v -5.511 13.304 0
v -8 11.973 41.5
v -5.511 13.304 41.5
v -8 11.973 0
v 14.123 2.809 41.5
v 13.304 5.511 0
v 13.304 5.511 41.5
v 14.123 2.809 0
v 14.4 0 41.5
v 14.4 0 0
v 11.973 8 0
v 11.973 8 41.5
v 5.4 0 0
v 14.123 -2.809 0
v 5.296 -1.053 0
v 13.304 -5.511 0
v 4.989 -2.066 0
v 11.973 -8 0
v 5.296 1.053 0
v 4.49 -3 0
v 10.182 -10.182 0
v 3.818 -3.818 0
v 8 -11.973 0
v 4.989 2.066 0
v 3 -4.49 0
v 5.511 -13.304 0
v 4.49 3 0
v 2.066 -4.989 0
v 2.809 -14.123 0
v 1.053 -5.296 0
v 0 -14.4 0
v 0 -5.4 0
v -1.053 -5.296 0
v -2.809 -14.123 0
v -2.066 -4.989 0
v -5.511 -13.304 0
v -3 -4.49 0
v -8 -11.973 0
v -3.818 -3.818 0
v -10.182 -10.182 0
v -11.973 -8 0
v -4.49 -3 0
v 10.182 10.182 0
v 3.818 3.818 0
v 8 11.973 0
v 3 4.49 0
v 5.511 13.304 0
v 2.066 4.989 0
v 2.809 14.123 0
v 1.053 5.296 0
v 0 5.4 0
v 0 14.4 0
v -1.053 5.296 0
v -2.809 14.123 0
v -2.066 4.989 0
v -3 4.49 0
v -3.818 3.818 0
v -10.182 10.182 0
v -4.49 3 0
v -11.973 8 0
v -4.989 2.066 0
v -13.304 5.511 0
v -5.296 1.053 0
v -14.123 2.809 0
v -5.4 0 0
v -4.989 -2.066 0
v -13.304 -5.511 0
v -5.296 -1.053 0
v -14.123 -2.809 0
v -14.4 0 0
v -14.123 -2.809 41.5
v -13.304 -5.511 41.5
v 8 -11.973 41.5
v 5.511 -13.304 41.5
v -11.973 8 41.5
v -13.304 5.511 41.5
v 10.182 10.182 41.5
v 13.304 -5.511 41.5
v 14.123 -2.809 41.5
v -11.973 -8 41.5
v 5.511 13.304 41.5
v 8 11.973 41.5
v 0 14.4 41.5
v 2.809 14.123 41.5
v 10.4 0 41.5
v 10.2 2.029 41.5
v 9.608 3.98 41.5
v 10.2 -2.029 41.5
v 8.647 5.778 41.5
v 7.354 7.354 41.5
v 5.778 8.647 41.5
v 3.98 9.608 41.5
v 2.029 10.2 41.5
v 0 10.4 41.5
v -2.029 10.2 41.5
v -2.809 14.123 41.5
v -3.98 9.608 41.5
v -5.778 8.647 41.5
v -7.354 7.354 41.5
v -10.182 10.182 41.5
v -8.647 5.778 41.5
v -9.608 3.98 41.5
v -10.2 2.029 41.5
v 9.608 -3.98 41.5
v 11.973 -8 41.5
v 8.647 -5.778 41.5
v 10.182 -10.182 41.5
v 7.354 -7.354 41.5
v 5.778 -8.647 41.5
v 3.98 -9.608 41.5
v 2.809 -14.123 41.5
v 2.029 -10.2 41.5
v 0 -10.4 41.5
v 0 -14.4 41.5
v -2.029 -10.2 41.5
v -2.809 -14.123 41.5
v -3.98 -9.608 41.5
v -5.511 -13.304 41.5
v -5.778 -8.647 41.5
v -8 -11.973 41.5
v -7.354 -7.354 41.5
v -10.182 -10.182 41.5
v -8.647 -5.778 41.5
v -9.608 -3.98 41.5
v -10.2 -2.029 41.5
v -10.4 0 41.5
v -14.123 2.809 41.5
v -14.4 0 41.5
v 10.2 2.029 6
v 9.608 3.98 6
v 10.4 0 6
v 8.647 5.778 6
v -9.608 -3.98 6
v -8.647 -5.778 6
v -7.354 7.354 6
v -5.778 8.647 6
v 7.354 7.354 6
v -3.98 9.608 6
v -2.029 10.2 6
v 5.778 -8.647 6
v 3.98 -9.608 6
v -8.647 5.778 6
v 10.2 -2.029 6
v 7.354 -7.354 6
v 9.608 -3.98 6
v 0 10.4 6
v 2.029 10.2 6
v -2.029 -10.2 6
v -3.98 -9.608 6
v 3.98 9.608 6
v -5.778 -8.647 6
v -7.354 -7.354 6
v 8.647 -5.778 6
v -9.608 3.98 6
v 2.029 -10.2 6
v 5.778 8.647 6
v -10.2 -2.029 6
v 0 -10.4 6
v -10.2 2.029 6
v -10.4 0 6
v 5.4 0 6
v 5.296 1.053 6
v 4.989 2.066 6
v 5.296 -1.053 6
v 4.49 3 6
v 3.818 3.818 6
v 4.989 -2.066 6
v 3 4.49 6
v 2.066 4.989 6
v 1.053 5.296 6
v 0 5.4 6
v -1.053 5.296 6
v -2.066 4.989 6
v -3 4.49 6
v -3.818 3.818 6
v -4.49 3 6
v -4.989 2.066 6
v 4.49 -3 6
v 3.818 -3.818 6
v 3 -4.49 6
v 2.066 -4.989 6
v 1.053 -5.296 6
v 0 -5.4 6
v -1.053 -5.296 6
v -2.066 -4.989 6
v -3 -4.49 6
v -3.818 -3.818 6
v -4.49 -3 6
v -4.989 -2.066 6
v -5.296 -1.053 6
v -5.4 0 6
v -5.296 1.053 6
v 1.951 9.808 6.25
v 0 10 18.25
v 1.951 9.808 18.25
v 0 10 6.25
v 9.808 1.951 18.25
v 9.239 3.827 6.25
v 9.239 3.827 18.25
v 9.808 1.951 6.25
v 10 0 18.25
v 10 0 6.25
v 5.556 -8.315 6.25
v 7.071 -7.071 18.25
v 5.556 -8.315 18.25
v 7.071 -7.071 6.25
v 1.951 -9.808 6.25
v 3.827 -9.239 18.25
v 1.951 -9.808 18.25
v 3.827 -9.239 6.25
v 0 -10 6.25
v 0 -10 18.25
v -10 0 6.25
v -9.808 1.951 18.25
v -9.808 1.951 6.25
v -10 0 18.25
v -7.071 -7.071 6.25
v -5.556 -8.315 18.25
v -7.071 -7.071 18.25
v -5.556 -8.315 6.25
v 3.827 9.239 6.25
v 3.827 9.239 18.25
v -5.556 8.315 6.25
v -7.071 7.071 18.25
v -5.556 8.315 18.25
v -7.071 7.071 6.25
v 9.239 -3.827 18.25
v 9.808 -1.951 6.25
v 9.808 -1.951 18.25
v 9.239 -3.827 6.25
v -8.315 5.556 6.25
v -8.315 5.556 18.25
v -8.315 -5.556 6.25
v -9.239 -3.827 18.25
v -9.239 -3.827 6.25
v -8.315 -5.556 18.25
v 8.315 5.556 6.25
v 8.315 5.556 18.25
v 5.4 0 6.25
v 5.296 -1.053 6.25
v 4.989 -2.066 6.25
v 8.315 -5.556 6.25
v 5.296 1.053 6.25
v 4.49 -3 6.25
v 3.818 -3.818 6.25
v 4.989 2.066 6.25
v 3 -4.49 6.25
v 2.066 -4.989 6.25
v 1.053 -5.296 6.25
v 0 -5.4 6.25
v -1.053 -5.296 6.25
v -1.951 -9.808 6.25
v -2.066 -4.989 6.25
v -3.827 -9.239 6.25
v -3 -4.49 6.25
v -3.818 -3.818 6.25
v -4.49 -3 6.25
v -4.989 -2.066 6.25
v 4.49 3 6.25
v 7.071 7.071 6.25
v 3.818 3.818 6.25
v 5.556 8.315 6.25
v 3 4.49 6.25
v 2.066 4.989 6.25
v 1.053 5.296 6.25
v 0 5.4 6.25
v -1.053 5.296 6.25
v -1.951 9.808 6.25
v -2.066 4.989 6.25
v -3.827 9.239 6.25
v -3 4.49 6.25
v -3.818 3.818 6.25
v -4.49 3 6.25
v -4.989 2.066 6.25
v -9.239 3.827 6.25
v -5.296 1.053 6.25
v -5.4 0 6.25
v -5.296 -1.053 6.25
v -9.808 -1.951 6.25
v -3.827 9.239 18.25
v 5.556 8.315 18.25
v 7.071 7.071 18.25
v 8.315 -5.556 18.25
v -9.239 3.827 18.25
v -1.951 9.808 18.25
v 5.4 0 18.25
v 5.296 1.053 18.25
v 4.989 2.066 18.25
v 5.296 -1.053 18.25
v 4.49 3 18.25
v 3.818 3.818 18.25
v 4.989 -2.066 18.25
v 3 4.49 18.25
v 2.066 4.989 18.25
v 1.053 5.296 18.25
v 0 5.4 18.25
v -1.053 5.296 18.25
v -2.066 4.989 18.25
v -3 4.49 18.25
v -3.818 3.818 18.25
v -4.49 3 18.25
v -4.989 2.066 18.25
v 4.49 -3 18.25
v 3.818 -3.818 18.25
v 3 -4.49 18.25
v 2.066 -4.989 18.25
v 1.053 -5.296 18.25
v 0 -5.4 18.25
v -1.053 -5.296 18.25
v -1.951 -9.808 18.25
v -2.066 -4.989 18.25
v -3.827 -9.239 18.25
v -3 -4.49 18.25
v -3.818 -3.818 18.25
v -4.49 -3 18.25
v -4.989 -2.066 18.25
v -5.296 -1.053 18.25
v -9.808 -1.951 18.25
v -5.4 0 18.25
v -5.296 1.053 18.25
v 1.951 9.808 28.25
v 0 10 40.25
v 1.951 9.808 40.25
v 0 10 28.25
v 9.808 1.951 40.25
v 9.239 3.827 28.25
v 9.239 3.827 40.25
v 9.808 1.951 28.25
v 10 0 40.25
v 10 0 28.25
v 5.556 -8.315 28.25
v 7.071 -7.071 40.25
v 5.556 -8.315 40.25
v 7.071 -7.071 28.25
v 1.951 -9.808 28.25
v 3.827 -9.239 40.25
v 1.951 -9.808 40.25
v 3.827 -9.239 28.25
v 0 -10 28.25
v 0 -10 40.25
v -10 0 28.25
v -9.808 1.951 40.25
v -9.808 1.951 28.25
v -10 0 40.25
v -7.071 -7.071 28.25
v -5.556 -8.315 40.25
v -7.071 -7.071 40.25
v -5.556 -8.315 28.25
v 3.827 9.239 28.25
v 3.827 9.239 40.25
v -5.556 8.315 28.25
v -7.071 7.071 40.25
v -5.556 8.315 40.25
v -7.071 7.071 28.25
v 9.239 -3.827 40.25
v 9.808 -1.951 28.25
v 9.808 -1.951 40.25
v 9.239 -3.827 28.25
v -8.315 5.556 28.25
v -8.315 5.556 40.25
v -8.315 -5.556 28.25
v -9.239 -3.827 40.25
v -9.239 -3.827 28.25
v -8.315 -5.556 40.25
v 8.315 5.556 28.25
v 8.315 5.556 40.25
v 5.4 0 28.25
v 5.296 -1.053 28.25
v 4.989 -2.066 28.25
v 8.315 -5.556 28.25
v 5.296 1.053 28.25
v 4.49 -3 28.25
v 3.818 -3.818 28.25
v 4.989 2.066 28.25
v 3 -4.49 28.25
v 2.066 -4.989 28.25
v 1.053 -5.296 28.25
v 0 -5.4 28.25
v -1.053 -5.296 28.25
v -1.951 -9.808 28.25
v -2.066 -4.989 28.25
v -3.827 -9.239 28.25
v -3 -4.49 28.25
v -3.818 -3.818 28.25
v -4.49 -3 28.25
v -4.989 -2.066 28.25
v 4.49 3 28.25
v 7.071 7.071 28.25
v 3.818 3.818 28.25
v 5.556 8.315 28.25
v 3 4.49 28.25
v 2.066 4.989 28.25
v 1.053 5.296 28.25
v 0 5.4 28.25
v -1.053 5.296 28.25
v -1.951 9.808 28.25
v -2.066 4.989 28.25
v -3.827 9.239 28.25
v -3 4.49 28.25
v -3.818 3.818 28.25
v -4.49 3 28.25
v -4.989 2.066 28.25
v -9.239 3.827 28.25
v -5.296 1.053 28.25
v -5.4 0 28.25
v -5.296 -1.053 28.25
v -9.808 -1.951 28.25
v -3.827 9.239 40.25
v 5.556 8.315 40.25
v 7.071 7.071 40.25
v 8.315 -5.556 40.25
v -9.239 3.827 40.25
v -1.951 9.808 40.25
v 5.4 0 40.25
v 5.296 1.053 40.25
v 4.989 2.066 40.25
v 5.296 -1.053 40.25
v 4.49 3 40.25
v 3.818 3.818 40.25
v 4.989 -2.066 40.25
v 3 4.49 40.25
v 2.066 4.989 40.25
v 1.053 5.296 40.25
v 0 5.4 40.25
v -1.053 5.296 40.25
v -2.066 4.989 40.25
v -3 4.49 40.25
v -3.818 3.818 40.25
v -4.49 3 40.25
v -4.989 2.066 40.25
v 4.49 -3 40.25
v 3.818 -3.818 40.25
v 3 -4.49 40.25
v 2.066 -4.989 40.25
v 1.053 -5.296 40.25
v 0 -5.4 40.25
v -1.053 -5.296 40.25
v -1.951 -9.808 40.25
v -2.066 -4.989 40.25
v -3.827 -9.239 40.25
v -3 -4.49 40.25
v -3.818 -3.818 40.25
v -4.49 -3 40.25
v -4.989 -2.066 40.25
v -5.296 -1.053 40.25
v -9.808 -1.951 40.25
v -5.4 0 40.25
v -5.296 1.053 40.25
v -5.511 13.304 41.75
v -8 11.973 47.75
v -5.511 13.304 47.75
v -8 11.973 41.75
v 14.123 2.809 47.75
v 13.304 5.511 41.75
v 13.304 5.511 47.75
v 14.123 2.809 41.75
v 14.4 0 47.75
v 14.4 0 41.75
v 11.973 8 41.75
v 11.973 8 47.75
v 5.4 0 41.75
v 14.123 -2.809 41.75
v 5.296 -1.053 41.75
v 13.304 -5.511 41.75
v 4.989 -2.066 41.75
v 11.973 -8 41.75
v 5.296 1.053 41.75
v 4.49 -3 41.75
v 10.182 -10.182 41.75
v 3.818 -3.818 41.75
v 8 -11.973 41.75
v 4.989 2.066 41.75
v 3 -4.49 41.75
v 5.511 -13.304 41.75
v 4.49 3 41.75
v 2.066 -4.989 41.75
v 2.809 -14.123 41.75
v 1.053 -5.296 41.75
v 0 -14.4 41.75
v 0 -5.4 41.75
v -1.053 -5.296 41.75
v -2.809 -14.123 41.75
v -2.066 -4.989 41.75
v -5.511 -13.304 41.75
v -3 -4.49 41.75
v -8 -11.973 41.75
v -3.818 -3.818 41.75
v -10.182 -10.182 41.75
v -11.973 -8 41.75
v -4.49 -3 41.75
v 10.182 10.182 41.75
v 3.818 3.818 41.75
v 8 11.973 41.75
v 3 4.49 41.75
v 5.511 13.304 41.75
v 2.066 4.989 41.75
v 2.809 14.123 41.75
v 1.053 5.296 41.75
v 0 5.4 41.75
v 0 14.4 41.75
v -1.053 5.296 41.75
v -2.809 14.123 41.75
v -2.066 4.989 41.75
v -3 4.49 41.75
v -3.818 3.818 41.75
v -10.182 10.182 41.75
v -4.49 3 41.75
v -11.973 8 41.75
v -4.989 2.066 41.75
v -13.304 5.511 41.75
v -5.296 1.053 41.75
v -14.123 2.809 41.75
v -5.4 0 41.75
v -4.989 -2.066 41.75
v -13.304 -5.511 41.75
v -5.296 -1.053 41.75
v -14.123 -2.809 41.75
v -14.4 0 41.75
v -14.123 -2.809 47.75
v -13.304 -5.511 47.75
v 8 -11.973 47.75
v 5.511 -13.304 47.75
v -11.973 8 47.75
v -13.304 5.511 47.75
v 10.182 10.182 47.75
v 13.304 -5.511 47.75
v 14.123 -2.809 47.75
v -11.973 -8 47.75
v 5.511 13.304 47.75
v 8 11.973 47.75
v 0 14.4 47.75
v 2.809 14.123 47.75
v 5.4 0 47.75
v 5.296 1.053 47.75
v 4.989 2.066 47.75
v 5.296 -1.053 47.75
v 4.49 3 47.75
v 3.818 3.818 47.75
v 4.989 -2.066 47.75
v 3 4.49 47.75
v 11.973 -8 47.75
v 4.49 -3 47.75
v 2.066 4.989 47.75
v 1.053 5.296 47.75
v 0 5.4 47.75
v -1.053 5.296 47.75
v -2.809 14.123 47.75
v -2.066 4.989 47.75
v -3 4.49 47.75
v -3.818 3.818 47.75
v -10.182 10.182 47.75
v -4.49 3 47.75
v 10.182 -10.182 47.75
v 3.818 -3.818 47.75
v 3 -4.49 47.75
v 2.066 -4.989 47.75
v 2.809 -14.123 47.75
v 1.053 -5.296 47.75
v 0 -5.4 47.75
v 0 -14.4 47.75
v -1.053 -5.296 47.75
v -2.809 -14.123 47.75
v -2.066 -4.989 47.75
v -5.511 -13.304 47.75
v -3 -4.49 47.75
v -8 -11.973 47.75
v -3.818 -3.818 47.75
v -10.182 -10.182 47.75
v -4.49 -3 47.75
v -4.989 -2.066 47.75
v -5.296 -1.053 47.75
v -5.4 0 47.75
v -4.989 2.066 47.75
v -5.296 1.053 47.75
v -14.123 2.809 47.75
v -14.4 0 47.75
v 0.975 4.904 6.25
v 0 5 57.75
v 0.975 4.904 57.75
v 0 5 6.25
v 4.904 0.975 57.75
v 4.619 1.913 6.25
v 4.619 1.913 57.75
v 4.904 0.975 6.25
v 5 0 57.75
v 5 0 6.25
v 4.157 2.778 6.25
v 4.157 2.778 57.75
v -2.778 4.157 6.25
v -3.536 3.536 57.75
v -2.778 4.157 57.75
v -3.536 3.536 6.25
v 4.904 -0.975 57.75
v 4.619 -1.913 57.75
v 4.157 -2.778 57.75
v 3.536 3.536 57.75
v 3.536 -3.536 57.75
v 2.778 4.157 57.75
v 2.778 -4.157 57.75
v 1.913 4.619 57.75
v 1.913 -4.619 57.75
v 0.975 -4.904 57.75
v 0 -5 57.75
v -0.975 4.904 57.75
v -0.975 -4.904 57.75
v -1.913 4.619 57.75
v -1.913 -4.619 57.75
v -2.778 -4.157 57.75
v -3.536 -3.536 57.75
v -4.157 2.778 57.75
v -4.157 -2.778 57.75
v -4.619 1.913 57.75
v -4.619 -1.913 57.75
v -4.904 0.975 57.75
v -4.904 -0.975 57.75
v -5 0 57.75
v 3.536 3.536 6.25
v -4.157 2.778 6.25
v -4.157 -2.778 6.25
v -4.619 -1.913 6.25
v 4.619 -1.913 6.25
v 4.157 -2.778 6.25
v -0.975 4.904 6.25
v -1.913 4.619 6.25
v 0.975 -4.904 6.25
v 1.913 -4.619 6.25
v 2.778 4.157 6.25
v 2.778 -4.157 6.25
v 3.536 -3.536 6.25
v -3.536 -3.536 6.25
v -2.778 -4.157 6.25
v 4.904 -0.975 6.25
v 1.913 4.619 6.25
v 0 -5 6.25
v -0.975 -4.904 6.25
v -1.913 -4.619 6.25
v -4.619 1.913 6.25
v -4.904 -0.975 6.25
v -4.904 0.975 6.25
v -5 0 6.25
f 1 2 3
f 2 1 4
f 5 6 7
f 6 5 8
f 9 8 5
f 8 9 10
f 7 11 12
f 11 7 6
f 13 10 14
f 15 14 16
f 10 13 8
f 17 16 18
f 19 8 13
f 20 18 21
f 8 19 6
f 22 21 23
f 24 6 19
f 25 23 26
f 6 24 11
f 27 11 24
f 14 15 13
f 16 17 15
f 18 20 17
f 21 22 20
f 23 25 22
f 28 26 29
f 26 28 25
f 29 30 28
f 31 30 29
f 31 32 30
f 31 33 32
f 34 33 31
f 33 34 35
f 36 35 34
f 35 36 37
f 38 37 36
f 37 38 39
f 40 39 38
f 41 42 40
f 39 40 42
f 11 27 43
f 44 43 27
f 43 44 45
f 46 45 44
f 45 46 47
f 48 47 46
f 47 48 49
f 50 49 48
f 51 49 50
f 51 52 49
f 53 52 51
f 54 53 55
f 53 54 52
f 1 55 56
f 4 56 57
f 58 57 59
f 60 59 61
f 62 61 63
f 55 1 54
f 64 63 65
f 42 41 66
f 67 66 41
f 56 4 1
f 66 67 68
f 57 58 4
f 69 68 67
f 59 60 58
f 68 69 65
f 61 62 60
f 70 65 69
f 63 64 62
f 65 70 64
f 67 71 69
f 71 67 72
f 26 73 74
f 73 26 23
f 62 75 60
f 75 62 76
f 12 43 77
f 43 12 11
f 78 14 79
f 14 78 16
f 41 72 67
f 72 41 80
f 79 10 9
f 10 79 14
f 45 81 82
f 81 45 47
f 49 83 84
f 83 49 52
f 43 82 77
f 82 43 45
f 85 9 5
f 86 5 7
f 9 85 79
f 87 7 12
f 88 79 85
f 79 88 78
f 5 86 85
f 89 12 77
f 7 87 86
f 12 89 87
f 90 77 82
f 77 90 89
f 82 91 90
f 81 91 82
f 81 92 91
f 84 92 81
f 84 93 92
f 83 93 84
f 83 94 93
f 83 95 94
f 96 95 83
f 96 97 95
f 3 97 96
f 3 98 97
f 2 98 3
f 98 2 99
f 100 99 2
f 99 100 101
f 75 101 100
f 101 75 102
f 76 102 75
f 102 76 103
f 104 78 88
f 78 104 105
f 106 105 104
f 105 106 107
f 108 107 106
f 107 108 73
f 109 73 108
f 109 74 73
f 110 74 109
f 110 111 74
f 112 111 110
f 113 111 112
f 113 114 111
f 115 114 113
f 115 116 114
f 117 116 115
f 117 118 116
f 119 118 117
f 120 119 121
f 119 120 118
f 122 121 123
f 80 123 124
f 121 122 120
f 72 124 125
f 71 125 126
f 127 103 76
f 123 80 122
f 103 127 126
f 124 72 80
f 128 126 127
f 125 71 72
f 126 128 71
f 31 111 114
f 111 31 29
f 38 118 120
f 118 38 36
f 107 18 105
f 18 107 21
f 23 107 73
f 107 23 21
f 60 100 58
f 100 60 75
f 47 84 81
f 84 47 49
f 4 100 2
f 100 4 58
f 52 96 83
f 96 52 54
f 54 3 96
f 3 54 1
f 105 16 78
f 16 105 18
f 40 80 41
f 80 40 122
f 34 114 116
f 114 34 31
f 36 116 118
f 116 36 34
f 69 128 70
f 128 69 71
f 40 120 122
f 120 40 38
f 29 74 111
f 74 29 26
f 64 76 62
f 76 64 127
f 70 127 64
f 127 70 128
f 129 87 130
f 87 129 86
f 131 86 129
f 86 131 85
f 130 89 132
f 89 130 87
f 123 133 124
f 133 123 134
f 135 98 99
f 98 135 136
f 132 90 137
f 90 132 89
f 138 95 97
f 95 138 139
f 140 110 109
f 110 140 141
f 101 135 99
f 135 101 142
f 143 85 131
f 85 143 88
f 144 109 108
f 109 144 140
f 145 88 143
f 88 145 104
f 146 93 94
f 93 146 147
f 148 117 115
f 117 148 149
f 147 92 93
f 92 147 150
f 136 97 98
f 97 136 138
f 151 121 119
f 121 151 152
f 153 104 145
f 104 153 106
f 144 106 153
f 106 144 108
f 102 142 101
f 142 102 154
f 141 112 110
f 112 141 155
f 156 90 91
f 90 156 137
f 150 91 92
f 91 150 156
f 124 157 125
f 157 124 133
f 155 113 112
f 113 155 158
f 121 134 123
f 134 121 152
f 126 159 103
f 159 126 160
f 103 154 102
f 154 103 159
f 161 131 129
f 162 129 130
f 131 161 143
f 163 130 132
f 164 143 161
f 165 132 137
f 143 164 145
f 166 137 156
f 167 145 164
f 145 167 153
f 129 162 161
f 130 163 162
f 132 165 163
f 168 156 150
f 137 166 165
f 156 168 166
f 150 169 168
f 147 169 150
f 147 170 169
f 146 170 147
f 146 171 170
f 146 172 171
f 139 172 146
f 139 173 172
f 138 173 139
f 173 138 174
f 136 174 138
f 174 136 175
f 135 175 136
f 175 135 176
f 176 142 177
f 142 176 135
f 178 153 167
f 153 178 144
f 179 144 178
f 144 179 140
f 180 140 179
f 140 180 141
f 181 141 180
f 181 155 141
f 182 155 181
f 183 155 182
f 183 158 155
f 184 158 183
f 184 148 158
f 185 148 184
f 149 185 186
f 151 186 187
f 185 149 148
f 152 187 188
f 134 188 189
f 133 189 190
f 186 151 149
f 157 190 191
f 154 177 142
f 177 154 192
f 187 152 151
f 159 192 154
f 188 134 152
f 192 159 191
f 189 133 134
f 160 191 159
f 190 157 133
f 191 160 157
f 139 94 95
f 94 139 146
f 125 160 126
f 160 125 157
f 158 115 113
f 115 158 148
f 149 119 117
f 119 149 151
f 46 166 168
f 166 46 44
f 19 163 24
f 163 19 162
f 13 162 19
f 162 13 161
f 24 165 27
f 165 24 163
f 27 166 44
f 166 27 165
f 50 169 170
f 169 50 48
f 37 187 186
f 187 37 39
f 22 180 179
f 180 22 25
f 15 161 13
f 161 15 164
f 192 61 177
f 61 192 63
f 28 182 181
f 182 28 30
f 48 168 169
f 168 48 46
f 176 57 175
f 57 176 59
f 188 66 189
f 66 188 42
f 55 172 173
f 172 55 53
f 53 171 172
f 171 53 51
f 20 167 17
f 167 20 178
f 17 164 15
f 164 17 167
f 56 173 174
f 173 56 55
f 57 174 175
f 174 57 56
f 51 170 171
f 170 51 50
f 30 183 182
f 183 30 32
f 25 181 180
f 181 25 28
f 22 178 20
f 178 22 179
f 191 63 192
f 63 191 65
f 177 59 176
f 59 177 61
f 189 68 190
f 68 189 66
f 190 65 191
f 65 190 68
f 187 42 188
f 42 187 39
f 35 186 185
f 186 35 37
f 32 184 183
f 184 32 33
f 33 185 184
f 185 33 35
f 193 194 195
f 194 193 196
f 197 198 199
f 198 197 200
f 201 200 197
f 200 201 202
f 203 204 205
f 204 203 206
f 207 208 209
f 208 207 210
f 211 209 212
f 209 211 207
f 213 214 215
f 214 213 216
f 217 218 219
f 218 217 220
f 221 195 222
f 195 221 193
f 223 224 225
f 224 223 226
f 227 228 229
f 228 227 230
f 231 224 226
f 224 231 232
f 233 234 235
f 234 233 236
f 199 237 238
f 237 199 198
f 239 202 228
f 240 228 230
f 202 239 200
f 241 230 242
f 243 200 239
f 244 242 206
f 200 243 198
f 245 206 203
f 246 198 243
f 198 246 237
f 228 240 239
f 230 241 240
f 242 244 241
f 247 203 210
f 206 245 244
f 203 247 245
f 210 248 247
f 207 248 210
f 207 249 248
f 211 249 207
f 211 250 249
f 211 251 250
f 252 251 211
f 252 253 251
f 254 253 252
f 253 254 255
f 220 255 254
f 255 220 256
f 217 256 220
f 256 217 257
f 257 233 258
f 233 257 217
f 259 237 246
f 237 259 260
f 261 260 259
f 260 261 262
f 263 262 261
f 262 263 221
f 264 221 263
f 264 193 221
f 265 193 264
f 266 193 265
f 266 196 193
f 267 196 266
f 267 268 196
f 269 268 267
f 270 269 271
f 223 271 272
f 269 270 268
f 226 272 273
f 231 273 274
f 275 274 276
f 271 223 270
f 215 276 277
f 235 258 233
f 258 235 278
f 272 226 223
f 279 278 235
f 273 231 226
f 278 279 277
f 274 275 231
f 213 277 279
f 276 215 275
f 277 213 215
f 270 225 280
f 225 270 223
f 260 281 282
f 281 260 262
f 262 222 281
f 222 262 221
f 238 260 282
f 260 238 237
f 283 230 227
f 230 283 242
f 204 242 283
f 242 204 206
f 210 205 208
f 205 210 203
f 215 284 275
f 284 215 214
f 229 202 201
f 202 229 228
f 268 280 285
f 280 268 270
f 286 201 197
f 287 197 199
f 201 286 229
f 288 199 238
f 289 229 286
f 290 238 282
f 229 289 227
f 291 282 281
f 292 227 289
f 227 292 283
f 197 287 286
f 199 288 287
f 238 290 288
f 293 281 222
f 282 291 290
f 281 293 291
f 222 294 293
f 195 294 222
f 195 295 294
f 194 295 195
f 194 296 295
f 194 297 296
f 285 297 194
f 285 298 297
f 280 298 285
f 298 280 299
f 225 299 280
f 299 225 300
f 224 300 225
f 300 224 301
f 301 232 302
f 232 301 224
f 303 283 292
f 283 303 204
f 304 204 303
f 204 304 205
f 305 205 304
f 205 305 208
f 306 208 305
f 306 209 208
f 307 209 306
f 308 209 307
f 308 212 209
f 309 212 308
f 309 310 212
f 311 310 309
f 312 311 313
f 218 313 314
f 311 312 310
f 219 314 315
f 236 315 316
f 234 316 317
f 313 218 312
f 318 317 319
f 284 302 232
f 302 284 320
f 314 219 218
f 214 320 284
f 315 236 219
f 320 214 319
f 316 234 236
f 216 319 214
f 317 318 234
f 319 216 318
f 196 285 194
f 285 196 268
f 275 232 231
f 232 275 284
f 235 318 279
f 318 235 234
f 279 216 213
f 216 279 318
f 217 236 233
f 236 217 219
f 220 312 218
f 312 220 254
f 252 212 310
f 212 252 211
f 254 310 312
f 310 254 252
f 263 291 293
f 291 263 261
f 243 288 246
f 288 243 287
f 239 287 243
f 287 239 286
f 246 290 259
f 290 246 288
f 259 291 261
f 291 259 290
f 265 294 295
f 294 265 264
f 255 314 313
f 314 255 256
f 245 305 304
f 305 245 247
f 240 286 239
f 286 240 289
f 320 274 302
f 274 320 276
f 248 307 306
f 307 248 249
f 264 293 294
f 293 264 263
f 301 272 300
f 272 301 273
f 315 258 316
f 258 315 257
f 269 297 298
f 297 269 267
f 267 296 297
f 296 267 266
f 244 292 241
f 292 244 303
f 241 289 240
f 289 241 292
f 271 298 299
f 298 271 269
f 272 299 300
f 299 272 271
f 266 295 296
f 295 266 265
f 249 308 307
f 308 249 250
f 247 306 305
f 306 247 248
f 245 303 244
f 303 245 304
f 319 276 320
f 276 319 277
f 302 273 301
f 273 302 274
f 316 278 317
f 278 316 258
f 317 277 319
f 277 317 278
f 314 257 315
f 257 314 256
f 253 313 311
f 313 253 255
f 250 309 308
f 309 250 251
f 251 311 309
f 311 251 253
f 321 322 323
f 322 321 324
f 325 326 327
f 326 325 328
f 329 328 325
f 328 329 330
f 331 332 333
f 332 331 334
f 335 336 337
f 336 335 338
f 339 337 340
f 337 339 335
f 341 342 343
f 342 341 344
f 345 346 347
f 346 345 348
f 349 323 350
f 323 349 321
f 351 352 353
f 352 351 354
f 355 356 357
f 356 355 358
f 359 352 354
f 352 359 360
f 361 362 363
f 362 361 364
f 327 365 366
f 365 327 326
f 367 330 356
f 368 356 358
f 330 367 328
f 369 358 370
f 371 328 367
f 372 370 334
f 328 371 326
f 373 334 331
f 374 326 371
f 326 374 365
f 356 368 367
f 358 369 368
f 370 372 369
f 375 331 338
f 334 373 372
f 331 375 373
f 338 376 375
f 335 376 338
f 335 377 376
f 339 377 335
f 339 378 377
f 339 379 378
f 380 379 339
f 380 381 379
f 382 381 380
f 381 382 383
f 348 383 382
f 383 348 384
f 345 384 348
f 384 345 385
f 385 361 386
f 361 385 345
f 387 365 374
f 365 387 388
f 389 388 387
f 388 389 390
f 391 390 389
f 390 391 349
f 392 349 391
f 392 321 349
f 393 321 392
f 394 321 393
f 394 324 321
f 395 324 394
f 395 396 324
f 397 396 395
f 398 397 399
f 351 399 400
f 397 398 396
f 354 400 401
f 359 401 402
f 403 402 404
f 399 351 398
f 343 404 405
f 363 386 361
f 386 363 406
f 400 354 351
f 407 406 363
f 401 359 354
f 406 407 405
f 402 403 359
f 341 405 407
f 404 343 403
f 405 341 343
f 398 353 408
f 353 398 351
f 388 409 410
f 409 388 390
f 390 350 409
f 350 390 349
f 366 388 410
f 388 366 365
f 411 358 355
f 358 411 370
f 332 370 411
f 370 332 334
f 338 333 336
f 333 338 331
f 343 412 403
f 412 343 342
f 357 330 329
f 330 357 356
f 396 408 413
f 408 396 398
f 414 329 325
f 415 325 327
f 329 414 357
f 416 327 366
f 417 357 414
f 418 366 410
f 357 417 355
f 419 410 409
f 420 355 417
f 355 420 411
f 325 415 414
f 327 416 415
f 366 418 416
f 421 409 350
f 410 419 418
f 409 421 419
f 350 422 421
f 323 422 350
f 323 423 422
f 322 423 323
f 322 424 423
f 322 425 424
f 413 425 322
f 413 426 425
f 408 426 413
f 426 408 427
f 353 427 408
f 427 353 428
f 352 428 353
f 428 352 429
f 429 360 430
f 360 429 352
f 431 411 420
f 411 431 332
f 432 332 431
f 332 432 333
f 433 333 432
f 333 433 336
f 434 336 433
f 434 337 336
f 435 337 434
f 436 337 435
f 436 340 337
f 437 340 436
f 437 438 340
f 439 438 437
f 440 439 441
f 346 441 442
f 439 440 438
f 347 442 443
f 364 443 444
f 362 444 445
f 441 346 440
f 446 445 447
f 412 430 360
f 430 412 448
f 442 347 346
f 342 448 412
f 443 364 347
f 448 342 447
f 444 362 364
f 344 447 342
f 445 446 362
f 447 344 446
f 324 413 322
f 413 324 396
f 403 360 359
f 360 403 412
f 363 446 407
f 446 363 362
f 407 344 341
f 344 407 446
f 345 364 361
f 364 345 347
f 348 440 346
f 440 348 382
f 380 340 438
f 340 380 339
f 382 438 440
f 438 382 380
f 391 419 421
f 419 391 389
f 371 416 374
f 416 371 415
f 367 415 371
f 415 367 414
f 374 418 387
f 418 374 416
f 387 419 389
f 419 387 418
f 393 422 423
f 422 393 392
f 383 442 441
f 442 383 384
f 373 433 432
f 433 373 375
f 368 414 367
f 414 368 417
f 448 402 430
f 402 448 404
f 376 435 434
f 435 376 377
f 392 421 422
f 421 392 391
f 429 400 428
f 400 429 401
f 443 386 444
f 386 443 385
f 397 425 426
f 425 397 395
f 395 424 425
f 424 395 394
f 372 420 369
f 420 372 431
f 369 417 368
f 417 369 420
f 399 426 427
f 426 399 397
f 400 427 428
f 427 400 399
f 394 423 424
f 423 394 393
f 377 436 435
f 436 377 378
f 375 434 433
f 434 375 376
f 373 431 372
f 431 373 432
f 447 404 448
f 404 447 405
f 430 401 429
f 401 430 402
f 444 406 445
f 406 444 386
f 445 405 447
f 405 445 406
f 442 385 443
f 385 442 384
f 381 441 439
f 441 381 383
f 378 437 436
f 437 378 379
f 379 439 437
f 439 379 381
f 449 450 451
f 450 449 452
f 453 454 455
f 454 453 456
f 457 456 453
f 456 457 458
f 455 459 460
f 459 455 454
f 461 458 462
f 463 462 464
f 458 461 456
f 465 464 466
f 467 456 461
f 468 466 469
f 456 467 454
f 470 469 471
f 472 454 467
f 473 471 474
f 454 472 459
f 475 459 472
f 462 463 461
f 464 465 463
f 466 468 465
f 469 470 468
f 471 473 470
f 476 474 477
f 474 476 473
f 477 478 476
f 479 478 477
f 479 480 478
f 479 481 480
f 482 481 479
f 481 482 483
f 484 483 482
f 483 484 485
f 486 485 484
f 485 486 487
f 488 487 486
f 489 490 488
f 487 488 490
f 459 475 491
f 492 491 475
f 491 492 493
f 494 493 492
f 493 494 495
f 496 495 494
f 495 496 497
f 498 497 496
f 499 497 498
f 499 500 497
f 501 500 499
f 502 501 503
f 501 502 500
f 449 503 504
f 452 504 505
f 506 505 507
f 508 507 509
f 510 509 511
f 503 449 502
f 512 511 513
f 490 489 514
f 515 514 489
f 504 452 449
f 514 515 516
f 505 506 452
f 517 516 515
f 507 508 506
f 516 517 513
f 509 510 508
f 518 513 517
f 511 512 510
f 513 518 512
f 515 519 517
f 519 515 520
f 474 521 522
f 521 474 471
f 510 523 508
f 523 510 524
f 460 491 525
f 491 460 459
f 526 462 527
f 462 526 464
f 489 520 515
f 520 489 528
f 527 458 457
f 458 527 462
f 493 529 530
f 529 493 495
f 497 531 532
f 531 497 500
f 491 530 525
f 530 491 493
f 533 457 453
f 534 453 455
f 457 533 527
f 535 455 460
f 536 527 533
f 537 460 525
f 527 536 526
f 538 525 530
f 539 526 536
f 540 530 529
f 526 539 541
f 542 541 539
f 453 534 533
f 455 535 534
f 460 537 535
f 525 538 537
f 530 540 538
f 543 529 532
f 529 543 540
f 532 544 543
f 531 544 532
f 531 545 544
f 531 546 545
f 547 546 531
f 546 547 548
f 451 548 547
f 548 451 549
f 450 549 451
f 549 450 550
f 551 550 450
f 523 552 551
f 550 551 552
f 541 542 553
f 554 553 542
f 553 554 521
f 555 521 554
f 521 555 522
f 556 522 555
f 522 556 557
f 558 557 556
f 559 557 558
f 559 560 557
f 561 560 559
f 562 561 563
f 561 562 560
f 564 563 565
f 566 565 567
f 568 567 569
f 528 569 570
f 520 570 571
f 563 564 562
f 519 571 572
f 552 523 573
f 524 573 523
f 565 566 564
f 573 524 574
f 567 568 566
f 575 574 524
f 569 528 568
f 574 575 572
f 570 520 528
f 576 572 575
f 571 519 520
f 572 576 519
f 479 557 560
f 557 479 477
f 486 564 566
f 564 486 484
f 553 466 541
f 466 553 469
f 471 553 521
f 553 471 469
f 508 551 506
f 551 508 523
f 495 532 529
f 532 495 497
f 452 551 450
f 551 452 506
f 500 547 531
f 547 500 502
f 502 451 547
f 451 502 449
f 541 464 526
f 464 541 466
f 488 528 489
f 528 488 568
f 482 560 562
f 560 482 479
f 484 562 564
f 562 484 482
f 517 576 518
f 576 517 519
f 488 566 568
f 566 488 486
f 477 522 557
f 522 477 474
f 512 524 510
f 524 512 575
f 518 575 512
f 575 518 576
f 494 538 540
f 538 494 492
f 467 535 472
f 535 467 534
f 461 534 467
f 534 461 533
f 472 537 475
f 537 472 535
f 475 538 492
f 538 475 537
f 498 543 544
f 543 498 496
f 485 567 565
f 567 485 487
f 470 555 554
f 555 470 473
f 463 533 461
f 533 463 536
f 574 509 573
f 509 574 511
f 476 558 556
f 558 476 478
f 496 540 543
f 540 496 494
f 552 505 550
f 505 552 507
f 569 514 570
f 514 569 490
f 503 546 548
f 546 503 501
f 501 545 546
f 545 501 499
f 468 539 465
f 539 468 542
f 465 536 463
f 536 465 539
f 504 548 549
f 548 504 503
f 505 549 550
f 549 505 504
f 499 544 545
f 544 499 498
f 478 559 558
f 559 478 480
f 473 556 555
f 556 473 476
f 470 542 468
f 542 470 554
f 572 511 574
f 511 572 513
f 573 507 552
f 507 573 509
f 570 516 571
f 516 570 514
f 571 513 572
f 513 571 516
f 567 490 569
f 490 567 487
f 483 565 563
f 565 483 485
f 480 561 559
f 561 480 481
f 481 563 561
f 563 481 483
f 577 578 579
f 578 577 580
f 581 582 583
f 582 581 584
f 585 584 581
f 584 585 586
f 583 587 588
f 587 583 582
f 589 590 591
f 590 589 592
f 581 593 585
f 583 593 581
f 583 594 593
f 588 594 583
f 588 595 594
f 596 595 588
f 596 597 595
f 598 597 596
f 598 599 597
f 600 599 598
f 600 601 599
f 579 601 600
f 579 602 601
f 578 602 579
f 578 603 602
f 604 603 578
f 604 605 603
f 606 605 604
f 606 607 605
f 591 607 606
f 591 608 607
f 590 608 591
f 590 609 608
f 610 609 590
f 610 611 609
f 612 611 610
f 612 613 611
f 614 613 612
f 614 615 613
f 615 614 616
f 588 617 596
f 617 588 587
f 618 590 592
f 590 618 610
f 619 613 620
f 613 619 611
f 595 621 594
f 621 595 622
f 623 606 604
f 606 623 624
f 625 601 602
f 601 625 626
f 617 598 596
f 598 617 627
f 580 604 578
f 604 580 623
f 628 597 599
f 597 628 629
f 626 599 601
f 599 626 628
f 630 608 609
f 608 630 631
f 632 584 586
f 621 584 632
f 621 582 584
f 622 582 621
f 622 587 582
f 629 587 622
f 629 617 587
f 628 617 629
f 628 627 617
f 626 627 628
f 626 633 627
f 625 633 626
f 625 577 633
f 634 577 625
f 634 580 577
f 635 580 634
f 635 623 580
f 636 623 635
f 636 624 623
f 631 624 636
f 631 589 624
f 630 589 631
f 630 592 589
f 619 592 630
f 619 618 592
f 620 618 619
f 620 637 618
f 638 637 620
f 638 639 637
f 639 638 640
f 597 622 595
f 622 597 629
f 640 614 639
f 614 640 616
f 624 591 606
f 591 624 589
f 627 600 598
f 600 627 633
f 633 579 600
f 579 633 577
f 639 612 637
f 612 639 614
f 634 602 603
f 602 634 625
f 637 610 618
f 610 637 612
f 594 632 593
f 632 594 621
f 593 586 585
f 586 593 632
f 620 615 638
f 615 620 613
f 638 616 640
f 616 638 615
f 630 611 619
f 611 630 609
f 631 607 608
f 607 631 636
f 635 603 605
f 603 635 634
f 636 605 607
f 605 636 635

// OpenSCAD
$fn = 32;

// ------------------------------------------------------------------------
// Shaft station: cup d28.8 x 41.5 mm, shaft d10
// Every part is its own module, assembly() places every instance.
// ------------------------------------------------------------------------

// --- part 1 ---
module housing_cup() {
  difference() {
    cylinder(h = 41.5, d = 28.8);
    translate([0, 0, 6]) cylinder(h = 36.5, d = 20.8);
    translate([0, 0, -1]) cylinder(h = 8, d = 10.8);
  }
}

// --- part 2 ---
module bearing_lower() {
  difference() {
      translate([0, 0, 0]) cylinder(h = 12, d = 20);
      translate([0, 0, -1]) cylinder(h = 14, d = 10.8);
    }
}

// --- part 3 ---
module bearing_upper() {
  difference() {
      translate([0, 0, 0]) cylinder(h = 12, d = 20);
      translate([0, 0, -1]) cylinder(h = 14, d = 10.8);
    }
}

// --- part 4 ---
module station_shaft() {
  translate([0, 0, -25.75]) cylinder(h = 51.5, d = 10);
}

// --- part 5 ---
module station_cover() {
  difference() {
    cylinder(h = 6, d = 28.8);
    translate([0, 0, -1]) cylinder(h = 8, d = 10.8);
  }
}

// --- assembly ---
module assembly() {
  color([0.80, 0.24, 0.20]) translate([0, 0, 0]) rotate([0, 0, 0]) housing_cup();
  color([0.20, 0.45, 0.75]) translate([0, 0, 6.25]) rotate([0, 0, 0]) bearing_lower();
  color([0.25, 0.62, 0.32]) translate([0, 0, 28.25]) rotate([0, 0, 0]) bearing_upper();
  color([0.92, 0.70, 0.18]) translate([0, 0, 32]) rotate([0, 0, 0]) station_shaft();
  color([0.58, 0.35, 0.70]) translate([0, 0, 41.75]) rotate([0, 0, 0]) station_cover();
}

assembly();
